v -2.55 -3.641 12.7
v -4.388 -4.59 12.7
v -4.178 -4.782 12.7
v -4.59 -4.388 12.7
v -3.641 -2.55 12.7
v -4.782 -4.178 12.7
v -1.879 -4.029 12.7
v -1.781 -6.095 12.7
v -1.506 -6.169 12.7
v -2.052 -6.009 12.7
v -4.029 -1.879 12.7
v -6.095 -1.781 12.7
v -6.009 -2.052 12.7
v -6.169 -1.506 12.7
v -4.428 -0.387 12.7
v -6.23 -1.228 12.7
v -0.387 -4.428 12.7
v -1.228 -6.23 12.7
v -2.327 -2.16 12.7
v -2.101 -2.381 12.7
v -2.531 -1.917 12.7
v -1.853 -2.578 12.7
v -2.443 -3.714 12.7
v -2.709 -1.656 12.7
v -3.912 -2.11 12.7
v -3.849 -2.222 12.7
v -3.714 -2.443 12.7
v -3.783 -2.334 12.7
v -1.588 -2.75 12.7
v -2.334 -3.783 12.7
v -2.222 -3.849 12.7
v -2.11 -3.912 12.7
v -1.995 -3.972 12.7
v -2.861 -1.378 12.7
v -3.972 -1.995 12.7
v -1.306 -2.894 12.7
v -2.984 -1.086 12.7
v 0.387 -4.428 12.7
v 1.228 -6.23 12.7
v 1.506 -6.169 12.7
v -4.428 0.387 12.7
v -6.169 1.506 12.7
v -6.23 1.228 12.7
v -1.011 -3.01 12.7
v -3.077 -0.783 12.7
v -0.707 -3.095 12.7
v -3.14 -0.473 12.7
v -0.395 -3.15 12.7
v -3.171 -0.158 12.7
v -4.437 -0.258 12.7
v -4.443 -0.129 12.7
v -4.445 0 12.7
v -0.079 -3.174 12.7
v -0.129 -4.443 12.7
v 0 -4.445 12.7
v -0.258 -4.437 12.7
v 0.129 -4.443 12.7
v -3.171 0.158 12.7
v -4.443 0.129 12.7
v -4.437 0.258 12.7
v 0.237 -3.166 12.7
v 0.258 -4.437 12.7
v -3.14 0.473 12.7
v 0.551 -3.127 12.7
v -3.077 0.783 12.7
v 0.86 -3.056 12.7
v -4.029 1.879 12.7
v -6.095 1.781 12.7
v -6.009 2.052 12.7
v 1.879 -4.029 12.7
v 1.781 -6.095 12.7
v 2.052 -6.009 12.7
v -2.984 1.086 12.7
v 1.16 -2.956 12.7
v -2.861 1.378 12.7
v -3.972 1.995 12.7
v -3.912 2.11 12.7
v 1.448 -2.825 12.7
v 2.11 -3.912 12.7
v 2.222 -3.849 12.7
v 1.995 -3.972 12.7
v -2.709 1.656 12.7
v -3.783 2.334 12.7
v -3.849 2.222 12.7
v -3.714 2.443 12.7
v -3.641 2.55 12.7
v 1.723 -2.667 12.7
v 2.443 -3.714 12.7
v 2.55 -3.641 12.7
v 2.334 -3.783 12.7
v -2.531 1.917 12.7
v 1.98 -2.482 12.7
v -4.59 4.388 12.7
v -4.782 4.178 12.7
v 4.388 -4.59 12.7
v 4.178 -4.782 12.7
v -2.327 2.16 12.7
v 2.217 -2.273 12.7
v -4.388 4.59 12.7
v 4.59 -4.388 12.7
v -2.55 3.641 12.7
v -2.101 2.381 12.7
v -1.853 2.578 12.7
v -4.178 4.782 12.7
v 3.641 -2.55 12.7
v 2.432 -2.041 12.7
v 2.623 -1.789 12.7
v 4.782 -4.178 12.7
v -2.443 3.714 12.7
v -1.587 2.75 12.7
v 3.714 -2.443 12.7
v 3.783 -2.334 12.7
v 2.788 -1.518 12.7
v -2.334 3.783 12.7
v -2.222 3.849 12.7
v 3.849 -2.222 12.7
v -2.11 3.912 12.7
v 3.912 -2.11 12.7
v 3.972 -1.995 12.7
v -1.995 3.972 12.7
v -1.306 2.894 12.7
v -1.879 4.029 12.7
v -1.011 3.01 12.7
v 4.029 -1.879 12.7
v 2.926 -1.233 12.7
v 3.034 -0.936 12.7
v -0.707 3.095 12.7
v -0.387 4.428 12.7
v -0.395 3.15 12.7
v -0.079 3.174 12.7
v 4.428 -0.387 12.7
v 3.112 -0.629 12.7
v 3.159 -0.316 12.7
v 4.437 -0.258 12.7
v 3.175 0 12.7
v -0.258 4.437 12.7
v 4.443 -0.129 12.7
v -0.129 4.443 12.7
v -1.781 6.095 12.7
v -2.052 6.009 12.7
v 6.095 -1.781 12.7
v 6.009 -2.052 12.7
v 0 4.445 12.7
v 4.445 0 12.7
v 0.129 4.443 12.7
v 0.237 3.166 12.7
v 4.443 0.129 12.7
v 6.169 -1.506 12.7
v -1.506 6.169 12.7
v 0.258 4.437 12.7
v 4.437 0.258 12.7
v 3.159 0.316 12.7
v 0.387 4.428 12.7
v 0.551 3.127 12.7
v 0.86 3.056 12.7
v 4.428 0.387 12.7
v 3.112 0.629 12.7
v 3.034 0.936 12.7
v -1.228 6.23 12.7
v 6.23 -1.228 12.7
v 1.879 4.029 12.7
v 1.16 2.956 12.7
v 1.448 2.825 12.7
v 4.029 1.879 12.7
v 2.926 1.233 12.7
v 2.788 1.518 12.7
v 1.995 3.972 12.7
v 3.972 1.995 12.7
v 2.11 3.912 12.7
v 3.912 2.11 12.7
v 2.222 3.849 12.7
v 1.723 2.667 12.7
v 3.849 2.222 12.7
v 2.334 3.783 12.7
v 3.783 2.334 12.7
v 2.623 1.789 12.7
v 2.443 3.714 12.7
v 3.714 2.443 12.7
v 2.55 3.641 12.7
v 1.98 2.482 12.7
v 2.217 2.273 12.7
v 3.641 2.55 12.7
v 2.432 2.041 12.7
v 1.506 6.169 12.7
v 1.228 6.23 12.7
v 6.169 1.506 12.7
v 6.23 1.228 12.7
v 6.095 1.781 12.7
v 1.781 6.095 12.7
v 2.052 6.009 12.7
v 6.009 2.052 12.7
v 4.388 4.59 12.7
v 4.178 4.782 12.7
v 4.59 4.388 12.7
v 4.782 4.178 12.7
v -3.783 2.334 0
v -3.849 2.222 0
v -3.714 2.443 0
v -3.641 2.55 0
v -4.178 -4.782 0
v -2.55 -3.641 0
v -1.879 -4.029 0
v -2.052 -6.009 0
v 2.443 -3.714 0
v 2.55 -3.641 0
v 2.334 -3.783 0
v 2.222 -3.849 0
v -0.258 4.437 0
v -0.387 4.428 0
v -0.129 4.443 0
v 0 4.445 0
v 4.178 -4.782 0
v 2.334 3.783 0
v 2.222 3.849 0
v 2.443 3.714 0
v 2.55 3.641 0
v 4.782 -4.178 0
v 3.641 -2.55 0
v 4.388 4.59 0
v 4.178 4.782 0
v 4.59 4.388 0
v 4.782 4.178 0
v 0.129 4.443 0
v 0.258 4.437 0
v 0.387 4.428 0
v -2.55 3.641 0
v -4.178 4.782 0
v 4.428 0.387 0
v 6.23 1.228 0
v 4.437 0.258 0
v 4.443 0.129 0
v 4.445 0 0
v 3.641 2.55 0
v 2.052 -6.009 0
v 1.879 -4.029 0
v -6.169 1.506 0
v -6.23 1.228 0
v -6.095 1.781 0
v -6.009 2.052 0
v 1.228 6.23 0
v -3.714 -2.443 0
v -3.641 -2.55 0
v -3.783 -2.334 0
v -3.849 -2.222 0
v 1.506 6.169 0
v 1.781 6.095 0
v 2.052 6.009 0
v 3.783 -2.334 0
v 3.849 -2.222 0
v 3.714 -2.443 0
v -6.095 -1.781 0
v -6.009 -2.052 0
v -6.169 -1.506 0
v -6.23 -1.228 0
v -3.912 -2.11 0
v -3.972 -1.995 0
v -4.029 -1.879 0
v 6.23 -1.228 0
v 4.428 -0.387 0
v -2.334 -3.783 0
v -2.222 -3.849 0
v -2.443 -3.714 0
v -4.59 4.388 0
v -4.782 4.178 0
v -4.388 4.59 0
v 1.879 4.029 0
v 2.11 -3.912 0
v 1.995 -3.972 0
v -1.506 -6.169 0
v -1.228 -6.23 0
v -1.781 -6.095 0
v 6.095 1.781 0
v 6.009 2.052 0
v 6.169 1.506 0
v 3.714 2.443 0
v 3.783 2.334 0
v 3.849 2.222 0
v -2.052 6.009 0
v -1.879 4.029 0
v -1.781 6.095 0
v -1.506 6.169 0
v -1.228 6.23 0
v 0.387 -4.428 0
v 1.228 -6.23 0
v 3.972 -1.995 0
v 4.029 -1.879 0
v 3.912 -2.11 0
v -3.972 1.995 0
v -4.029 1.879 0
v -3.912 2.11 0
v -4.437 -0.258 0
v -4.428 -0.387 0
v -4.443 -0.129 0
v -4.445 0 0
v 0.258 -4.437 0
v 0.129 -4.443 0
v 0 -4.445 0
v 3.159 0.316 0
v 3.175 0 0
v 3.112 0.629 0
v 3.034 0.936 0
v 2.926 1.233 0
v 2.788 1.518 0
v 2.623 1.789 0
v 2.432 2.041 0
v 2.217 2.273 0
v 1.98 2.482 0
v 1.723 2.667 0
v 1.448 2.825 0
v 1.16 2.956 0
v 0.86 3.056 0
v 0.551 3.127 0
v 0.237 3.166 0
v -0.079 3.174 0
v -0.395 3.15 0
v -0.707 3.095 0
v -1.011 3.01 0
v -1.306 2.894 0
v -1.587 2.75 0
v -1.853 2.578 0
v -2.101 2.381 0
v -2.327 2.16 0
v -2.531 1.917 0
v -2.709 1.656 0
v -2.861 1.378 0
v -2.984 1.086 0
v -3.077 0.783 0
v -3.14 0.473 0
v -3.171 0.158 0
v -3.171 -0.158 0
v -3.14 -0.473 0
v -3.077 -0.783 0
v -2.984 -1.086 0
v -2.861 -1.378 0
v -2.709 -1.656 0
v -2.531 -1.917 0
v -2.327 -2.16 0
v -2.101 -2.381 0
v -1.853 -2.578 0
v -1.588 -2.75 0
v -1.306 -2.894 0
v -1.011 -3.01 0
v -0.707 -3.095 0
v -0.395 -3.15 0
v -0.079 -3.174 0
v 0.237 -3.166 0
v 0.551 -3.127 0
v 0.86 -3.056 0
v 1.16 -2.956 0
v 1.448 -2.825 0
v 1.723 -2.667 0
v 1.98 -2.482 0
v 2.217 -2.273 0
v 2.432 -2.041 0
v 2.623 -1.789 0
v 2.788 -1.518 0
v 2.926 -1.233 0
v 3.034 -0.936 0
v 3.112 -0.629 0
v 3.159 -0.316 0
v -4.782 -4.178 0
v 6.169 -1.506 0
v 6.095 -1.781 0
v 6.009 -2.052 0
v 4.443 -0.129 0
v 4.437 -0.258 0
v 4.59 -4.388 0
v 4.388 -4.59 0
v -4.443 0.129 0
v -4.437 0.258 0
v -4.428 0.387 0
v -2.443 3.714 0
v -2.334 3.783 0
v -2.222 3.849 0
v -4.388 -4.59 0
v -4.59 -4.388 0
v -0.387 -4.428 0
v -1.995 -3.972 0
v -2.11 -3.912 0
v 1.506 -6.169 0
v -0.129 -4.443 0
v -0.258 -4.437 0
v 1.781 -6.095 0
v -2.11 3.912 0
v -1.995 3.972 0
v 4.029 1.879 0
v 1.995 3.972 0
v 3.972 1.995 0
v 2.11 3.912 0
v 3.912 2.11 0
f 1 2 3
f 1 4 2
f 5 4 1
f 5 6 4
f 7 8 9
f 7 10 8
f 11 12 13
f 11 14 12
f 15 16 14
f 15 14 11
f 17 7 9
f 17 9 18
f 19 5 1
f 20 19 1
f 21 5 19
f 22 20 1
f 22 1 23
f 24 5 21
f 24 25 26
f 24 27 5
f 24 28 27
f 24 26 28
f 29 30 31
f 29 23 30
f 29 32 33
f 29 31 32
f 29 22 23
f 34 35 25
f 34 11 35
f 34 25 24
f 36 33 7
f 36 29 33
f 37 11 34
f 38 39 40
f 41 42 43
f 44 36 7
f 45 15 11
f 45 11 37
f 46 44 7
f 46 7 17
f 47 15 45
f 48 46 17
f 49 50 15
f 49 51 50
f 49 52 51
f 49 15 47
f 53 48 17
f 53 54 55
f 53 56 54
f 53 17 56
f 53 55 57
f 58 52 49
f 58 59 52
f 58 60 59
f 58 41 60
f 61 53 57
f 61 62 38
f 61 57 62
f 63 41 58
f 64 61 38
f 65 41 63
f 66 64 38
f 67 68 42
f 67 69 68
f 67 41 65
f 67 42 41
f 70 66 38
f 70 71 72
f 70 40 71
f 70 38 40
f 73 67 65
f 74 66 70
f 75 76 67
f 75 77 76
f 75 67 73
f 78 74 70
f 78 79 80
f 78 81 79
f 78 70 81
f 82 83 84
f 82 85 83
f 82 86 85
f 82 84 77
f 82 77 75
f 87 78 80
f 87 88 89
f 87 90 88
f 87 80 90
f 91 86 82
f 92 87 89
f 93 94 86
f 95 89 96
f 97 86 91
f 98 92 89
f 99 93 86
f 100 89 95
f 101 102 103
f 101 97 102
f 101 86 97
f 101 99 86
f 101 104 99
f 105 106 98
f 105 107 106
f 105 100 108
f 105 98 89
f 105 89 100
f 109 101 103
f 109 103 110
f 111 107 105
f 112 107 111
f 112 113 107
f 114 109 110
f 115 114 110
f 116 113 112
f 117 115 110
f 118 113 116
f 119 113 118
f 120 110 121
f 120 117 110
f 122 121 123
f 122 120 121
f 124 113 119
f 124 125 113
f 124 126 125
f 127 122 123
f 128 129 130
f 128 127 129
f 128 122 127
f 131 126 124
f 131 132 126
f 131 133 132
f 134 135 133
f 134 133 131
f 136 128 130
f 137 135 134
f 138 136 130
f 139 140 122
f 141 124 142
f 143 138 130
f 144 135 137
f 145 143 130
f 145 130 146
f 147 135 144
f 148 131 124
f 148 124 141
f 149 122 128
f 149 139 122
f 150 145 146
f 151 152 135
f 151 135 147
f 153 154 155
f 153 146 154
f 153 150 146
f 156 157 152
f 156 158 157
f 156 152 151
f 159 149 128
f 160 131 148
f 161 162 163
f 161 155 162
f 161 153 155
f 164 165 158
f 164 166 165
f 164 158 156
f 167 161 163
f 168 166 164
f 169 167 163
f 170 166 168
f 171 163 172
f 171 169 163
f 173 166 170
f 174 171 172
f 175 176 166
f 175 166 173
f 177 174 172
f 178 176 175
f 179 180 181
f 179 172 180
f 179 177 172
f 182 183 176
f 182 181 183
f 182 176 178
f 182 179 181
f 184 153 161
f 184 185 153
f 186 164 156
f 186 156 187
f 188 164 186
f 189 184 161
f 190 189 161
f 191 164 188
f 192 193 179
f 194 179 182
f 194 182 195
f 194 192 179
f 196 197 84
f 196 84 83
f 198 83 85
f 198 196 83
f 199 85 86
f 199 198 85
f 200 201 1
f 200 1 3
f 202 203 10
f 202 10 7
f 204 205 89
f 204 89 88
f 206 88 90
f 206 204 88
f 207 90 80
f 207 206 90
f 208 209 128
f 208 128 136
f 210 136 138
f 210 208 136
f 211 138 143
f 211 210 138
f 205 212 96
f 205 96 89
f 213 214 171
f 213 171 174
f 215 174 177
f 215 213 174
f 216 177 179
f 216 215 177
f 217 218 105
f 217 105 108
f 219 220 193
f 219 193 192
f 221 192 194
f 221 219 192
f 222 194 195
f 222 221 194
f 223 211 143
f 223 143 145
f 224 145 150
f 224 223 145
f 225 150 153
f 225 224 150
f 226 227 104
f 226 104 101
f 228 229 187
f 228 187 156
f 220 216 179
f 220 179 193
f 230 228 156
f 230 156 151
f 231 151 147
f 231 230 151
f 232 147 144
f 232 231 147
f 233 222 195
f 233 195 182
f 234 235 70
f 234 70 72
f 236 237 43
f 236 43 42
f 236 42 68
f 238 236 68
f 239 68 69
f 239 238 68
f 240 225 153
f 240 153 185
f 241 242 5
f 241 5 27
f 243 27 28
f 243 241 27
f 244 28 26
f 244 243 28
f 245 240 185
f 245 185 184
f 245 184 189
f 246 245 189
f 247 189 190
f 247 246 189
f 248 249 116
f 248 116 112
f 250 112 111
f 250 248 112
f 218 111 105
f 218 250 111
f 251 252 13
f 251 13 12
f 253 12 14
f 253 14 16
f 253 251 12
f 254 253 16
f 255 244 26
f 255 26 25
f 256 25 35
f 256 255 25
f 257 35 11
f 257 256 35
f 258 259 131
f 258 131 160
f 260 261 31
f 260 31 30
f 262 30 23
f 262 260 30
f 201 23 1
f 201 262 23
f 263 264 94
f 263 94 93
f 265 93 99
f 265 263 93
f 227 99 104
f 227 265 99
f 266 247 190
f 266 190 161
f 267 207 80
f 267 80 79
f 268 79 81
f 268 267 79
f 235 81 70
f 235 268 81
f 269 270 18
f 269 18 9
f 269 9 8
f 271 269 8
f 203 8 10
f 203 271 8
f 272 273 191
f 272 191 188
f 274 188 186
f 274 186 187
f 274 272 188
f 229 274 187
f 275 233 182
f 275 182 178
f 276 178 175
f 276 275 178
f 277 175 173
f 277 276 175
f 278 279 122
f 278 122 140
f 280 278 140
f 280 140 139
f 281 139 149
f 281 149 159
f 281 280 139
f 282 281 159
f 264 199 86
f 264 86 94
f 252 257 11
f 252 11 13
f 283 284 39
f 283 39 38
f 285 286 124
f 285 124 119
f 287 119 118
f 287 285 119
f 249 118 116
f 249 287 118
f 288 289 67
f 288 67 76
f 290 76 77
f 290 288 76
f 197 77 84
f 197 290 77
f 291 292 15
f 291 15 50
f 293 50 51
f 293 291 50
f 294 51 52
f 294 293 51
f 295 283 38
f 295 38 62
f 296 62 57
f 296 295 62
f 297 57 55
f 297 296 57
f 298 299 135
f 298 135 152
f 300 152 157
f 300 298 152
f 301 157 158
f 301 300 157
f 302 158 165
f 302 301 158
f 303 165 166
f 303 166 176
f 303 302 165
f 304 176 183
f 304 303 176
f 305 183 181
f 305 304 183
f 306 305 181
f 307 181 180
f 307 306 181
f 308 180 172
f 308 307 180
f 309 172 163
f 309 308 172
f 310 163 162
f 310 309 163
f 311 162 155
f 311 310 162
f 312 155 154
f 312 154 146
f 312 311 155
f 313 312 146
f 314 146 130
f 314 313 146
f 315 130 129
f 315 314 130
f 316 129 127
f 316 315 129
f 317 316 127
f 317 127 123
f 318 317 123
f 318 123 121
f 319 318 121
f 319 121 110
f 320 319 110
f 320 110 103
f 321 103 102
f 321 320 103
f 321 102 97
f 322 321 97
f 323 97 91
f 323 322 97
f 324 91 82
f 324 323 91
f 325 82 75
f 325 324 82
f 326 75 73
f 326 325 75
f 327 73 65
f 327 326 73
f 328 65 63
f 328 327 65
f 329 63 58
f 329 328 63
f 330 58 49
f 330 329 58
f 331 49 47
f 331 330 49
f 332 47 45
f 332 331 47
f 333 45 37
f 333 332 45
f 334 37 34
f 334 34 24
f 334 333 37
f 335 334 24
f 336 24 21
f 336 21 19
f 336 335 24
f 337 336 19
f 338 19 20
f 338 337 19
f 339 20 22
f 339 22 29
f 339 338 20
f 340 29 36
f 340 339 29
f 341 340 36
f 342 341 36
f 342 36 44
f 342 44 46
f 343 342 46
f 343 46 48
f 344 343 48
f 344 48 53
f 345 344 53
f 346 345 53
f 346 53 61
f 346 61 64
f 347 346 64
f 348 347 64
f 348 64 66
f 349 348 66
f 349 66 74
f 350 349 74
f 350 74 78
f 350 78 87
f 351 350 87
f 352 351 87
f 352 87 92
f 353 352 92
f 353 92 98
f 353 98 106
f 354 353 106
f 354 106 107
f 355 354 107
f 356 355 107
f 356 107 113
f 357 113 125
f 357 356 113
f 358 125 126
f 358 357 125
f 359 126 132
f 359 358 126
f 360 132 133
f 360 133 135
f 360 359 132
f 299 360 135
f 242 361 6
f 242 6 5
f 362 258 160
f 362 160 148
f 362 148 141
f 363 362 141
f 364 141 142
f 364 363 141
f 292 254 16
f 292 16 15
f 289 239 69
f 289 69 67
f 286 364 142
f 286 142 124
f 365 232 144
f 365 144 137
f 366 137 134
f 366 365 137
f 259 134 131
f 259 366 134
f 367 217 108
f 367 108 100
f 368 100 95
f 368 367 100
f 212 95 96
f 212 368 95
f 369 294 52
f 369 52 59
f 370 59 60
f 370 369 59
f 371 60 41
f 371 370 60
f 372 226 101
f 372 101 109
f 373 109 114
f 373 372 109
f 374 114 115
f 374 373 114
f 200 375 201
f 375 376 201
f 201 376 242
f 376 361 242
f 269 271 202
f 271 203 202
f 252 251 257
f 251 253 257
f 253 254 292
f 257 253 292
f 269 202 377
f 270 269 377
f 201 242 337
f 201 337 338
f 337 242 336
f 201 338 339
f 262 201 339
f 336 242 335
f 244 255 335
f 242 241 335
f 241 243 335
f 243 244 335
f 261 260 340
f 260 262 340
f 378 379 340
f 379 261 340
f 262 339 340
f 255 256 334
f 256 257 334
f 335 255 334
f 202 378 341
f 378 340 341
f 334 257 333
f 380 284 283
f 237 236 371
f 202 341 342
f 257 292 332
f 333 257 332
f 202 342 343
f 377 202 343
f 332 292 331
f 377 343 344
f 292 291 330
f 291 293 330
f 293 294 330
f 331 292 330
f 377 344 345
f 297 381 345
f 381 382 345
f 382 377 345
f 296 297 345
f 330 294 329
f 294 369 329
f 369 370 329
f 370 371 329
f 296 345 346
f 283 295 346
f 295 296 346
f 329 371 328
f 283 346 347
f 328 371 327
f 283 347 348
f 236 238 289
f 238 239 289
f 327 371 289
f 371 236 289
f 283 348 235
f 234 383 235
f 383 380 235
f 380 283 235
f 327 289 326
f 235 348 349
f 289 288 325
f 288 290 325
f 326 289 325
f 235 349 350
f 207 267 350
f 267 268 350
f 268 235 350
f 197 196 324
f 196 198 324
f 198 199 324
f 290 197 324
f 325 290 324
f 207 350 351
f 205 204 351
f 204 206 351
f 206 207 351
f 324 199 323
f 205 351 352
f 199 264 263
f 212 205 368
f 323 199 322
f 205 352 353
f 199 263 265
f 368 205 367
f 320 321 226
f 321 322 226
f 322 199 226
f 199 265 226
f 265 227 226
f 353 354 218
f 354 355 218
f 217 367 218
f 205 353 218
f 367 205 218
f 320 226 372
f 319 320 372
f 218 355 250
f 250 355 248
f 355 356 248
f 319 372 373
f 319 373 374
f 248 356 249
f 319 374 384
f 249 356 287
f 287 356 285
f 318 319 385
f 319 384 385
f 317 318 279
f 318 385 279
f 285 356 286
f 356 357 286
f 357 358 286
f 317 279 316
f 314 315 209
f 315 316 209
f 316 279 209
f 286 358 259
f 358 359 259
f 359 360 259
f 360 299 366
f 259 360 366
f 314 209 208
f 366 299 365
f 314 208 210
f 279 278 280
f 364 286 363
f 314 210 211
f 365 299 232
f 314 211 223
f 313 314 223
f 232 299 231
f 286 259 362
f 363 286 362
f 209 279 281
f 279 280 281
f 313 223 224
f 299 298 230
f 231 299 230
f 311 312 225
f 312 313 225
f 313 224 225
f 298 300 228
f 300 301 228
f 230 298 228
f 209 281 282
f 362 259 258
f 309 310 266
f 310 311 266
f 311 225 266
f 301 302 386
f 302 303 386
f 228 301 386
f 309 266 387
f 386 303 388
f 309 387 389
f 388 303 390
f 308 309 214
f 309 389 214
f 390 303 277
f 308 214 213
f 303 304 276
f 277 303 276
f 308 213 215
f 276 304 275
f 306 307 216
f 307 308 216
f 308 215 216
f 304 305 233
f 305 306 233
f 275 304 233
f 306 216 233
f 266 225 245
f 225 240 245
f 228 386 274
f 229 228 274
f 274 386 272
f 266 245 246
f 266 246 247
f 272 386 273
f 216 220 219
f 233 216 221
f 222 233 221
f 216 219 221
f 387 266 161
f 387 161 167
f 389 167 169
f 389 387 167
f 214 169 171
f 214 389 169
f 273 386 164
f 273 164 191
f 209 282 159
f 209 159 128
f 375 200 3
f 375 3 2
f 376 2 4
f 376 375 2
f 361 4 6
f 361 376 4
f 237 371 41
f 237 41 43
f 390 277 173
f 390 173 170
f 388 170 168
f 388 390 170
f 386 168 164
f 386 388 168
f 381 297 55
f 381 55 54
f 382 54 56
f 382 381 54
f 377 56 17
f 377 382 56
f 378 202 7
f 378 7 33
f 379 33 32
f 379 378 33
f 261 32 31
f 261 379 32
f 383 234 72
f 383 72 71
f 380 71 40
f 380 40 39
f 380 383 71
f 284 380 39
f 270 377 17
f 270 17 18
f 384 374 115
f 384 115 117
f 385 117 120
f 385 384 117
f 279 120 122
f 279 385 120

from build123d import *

# Parameters (mm, degrees)
F0_R     = 6.35
F0_R_2   = 3.175
F1_DEPTH = 12.7
F2_R     = 6.699885
F3_DEPTH = 12.7


with BuildPart() as f1:
    # F0 (on Top) → F1 (new body)
    with BuildSketch(Plane.XY):
        Circle(F0_R)
        Circle(F0_R_2, mode=Mode.SUBTRACT)
    extrude(amount=F1_DEPTH)

    # F2 (on Top) → F3 (cut, through all)
    with BuildSketch(Plane.XY):
        Circle(F2_R)
        with BuildLine():
            ThreePointArc((-4.428085, -0.387407), (-4.440769, -0.193888), (-4.445, 0))
            ThreePointArc((-4.445, 0), (-4.440769, 0.193888), (-4.428085, 0.387407))
            Line((-4.428085, 0.387407), (-6.230181, 1.227738))
            ThreePointArc((-6.230181, 1.227738), (-6.133629, 1.643501), (-6.009364, 2.051838))
            Line((-6.009364, 2.051838), (-4.028538, 1.878538))
            ThreePointArc((-4.028538, 1.878538), (-3.942763, 2.052473), (-3.849483, 2.2225))
            ThreePointArc((-3.849483, 2.2225), (-3.748875, 2.388297), (-3.641131, 2.549547))
            Line((-3.641131, 2.549547), (-4.781626, 4.178343))
            ThreePointArc((-4.781626, 4.178343), (-4.490128, 4.490128), (-4.178343, 4.781626))
            Line((-4.178343, 4.781626), (-2.549547, 3.641131))
            ThreePointArc((-2.549547, 3.641131), (-2.388297, 3.748875), (-2.2225, 3.849483))
            ThreePointArc((-2.2225, 3.849483), (-2.052473, 3.942763), (-1.878538, 4.028538))
            Line((-1.878538, 4.028538), (-2.051838, 6.009364))
            ThreePointArc((-2.051838, 6.009364), (-1.643501, 6.133629), (-1.227738, 6.230181))
            Line((-1.227738, 6.230181), (-0.387407, 4.428085))
            ThreePointArc((-0.387407, 4.428085), (-0.193888, 4.440769), (0, 4.445))
            ThreePointArc((0, 4.445), (0.193888, 4.440769), (0.387407, 4.428085))
            Line((0.387407, 4.428085), (1.227738, 6.230181))
            ThreePointArc((1.227738, 6.230181), (1.643501, 6.133629), (2.051838, 6.009364))
            Line((2.051838, 6.009364), (1.878538, 4.028538))
            ThreePointArc((1.878538, 4.028538), (2.052473, 3.942763), (2.2225, 3.849483))
            ThreePointArc((2.2225, 3.849483), (2.388297, 3.748875), (2.549547, 3.641131))
            Line((2.549547, 3.641131), (4.178343, 4.781626))
            ThreePointArc((4.178343, 4.781626), (4.490128, 4.490128), (4.781626, 4.178343))
            Line((4.781626, 4.178343), (3.641131, 2.549547))
            ThreePointArc((3.641131, 2.549547), (3.748875, 2.388297), (3.849483, 2.2225))
            ThreePointArc((3.849483, 2.2225), (3.942763, 2.052473), (4.028538, 1.878538))
            Line((4.028538, 1.878538), (6.009364, 2.051838))
            ThreePointArc((6.009364, 2.051838), (6.133629, 1.643501), (6.230181, 1.227738))
            Line((6.230181, 1.227738), (4.428085, 0.387407))
            ThreePointArc((4.428085, 0.387407), (4.440769, 0.193888), (4.445, 0))
            ThreePointArc((4.445, 0), (4.440769, -0.193888), (4.428085, -0.387407))
            Line((4.428085, -0.387407), (6.230181, -1.227738))
            ThreePointArc((6.230181, -1.227738), (6.133629, -1.643501), (6.009364, -2.051838))
            Line((6.009364, -2.051838), (4.028538, -1.878538))
            ThreePointArc((4.028538, -1.878538), (3.942763, -2.052473), (3.849483, -2.2225))
            ThreePointArc((3.849483, -2.2225), (3.748875, -2.388297), (3.641131, -2.549547))
            Line((3.641131, -2.549547), (4.781626, -4.178343))
            ThreePointArc((4.781626, -4.178343), (4.490128, -4.490128), (4.178343, -4.781626))
            Line((4.178343, -4.781626), (2.549547, -3.641131))
            ThreePointArc((2.549547, -3.641131), (2.388297, -3.748875), (2.2225, -3.849483))
            ThreePointArc((2.2225, -3.849483), (2.052473, -3.942763), (1.878538, -4.028538))
            Line((1.878538, -4.028538), (2.051838, -6.009364))
            ThreePointArc((2.051838, -6.009364), (1.643501, -6.133629), (1.227738, -6.230181))
            Line((1.227738, -6.230181), (0.387407, -4.428085))
            ThreePointArc((0.387407, -4.428085), (0.193888, -4.440769), (0, -4.445))
            ThreePointArc((0, -4.445), (-0.193888, -4.440769), (-0.387407, -4.428085))
            Line((-0.387407, -4.428085), (-1.227738, -6.230181))
            ThreePointArc((-1.227738, -6.230181), (-1.643501, -6.133629), (-2.051838, -6.009364))
            Line((-2.051838, -6.009364), (-1.878538, -4.028538))
            ThreePointArc((-1.878538, -4.028538), (-2.052473, -3.942763), (-2.2225, -3.849483))
            ThreePointArc((-2.2225, -3.849483), (-2.388297, -3.748875), (-2.549547, -3.641131))
            Line((-2.549547, -3.641131), (-4.178343, -4.781626))
            ThreePointArc((-4.178343, -4.781626), (-4.490128, -4.490128), (-4.781626, -4.178343))
            Line((-4.781626, -4.178343), (-3.641131, -2.549547))
            ThreePointArc((-3.641131, -2.549547), (-3.748875, -2.388297), (-3.849483, -2.2225))
            ThreePointArc((-3.849483, -2.2225), (-3.942763, -2.052473), (-4.028538, -1.878538))
            Line((-4.028538, -1.878538), (-6.009364, -2.051838))
            ThreePointArc((-6.009364, -2.051838), (-6.133629, -1.643501), (-6.230181, -1.227738))
            Line((-6.230181, -1.227738), (-4.428085, -0.387407))
        make_face(mode=Mode.SUBTRACT)
    extrude(amount=F3_DEPTH, mode=Mode.SUBTRACT)


solid = f1.part
